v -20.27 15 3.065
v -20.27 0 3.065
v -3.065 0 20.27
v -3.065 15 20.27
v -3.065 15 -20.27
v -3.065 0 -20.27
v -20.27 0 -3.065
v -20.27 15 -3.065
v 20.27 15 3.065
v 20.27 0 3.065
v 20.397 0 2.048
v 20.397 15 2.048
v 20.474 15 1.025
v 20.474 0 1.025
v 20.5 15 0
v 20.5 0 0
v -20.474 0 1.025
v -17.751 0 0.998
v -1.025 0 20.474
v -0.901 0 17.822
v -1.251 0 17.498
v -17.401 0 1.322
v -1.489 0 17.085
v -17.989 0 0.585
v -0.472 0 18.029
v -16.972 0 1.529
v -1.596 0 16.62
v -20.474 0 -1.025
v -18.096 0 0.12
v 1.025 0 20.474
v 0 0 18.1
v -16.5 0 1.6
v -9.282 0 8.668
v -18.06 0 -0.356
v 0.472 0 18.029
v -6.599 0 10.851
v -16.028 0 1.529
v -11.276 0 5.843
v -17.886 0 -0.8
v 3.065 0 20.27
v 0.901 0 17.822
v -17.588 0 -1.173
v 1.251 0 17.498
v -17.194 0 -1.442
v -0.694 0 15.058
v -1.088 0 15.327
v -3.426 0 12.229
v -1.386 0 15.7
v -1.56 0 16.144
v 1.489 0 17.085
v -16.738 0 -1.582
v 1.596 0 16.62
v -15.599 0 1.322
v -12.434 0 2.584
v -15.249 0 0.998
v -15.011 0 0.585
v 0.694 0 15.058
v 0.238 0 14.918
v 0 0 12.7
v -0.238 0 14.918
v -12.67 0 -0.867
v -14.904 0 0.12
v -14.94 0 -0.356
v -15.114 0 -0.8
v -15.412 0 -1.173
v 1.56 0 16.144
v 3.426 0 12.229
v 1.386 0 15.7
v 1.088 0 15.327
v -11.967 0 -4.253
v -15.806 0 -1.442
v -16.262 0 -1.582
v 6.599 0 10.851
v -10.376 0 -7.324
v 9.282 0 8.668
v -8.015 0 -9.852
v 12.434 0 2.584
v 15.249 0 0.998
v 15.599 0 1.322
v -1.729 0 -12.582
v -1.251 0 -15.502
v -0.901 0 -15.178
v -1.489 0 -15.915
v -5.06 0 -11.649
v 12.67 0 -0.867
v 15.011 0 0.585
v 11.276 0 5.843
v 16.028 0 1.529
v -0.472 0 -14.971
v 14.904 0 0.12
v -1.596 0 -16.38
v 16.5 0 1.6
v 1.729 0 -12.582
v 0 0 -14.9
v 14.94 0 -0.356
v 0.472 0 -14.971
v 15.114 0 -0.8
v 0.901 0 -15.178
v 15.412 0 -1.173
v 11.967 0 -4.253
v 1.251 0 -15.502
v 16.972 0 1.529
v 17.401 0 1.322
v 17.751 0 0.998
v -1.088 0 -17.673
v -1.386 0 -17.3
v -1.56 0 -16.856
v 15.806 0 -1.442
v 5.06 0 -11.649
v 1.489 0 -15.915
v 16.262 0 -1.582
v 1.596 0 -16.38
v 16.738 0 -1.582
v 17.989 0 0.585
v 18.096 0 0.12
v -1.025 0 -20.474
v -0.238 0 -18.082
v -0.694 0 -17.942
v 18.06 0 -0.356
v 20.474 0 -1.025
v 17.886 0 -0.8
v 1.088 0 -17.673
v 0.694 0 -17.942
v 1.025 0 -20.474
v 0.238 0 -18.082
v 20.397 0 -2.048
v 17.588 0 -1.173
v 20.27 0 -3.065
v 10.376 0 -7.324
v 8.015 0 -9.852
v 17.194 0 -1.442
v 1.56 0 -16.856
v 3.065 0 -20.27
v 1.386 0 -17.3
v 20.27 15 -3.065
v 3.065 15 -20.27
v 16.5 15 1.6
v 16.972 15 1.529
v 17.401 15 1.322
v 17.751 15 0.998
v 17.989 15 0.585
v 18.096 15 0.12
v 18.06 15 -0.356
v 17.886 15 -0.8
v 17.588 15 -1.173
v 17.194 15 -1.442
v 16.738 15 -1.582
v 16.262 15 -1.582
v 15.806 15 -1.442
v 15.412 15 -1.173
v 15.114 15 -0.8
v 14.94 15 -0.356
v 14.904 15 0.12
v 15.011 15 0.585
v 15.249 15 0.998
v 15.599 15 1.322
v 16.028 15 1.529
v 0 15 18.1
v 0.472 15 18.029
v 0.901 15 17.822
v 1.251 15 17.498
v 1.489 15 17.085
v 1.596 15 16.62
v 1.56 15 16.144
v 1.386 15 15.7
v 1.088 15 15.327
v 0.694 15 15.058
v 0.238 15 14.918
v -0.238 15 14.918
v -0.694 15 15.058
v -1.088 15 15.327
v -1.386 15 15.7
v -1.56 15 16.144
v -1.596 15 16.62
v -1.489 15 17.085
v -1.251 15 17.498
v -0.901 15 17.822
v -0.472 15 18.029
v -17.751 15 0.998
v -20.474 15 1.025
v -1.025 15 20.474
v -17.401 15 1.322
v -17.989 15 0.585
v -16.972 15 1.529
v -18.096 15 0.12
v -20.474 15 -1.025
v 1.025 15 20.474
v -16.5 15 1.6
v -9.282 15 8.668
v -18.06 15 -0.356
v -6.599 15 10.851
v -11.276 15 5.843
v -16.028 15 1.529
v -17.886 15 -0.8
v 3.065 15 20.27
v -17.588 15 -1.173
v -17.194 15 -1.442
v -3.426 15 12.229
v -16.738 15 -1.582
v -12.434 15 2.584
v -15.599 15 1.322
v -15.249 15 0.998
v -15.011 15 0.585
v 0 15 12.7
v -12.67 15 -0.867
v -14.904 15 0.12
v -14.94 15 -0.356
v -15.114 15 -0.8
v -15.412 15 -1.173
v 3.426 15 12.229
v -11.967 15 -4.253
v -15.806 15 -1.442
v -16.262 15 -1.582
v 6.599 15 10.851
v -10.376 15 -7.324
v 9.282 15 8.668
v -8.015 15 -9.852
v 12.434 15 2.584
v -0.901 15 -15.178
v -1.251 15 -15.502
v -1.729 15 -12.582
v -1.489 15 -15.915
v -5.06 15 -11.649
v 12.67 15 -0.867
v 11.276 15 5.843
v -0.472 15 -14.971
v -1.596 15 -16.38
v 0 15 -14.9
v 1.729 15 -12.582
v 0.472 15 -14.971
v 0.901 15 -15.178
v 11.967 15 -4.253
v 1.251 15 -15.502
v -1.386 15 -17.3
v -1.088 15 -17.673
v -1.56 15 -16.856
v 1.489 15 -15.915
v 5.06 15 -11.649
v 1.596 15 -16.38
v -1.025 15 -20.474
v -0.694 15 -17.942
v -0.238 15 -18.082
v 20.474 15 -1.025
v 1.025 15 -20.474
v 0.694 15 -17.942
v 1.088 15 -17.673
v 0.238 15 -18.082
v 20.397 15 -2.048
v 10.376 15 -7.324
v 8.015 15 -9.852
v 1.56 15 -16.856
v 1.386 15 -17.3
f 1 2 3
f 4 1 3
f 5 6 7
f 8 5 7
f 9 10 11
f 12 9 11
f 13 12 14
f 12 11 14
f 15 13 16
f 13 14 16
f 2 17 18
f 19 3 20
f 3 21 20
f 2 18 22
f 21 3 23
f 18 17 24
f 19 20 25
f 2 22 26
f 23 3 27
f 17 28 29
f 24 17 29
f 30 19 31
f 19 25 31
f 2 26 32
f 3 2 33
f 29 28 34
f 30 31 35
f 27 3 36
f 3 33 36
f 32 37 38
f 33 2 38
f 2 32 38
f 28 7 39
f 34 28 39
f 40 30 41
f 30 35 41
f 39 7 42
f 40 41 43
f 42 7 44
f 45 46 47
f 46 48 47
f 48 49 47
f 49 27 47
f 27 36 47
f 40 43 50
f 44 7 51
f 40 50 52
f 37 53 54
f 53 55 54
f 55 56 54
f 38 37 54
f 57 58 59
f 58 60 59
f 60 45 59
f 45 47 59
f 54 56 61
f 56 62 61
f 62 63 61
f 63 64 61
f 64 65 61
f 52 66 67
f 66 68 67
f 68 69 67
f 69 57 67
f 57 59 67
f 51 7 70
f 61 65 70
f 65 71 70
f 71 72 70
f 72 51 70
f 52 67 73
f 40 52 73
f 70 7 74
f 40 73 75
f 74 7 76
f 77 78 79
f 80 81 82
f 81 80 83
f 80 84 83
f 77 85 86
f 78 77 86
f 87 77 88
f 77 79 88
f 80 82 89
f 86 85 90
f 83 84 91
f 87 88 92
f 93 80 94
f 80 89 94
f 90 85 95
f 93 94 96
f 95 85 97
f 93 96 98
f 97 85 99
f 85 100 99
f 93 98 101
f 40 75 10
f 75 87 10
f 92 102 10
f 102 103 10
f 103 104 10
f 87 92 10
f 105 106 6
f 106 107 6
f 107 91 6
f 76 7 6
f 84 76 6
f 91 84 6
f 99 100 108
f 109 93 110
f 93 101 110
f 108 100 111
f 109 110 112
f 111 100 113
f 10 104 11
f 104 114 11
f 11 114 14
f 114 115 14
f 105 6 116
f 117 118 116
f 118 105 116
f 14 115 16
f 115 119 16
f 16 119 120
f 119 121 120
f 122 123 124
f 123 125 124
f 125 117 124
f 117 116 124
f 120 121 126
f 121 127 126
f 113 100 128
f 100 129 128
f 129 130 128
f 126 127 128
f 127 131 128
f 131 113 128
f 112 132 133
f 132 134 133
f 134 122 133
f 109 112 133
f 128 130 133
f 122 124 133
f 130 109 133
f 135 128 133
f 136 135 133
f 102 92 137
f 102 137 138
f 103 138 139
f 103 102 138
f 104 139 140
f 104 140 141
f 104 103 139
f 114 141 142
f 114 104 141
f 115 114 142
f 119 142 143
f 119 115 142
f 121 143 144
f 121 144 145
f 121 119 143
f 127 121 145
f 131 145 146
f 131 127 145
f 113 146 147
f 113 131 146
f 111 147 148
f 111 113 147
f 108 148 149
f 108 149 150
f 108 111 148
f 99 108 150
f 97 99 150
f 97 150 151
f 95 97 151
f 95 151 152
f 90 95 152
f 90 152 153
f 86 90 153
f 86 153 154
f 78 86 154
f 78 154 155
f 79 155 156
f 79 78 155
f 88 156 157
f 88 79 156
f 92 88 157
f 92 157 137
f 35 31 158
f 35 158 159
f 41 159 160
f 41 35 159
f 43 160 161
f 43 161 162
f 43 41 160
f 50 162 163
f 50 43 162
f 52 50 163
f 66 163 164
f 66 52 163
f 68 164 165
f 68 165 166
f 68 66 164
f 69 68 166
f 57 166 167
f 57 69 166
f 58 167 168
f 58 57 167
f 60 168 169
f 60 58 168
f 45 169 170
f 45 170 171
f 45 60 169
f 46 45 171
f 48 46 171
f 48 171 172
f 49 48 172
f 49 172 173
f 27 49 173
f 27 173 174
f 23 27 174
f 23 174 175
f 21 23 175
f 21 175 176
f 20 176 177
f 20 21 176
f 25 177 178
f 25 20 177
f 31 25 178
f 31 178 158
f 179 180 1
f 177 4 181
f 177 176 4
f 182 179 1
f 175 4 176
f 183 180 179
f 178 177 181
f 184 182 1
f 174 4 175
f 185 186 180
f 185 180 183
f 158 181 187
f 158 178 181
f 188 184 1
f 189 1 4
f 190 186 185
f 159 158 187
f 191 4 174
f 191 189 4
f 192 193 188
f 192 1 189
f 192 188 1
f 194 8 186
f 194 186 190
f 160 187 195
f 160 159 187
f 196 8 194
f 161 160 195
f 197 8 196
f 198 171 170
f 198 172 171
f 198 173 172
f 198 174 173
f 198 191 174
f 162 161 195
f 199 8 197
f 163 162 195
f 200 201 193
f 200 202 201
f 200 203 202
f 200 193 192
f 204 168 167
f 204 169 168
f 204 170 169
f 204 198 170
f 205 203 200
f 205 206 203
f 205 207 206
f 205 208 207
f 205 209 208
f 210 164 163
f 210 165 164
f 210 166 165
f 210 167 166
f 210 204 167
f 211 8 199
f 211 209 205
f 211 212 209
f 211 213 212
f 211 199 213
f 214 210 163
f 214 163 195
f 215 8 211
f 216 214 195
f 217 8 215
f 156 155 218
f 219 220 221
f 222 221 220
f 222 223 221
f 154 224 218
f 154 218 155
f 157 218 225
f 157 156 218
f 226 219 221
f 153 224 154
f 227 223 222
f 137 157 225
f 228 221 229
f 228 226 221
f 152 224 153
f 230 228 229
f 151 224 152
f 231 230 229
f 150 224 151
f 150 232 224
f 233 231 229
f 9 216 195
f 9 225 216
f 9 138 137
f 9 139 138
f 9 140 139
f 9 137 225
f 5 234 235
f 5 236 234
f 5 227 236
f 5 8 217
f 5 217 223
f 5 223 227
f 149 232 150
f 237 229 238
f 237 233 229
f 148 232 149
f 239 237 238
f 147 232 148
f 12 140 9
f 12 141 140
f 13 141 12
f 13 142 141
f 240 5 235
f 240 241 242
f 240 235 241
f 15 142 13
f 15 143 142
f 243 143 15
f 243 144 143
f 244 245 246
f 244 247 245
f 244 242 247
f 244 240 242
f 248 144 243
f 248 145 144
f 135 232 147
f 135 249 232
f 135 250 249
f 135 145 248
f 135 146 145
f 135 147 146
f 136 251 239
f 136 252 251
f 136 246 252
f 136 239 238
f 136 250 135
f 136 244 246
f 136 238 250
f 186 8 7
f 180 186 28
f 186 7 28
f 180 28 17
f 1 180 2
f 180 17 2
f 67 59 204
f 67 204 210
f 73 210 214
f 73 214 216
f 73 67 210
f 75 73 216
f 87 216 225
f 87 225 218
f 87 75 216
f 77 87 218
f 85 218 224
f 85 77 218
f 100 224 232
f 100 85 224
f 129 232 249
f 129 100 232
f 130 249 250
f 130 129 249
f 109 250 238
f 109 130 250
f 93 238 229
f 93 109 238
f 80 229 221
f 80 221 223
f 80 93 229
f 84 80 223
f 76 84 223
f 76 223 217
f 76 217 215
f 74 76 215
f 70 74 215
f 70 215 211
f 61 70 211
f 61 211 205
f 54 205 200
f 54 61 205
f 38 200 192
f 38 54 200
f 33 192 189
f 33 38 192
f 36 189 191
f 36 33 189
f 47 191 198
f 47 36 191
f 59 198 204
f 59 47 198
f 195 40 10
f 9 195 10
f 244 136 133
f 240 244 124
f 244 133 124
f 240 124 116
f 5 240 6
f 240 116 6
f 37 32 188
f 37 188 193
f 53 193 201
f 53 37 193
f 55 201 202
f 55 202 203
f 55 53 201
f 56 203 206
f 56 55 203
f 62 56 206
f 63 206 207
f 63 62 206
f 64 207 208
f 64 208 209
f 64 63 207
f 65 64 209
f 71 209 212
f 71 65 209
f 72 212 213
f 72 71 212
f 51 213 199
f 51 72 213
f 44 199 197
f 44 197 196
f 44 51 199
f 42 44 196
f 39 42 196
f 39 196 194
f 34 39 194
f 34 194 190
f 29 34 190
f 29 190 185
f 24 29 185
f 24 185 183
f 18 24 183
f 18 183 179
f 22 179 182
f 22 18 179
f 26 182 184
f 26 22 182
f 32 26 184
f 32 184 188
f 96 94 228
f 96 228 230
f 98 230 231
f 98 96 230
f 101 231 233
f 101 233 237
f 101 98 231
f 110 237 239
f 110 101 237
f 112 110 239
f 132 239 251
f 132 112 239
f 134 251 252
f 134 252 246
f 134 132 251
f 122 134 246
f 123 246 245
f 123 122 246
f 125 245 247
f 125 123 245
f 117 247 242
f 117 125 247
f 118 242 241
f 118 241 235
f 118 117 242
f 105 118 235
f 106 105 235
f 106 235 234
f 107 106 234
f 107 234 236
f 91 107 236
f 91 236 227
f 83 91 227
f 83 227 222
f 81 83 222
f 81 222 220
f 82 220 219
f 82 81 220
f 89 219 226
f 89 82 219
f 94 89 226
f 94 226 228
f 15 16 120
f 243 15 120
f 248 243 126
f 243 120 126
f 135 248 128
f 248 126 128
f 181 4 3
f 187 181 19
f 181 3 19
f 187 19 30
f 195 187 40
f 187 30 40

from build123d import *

# Parameters (mm, degrees)
SKETCH_1_R      = 1.6
SKETCH_1_R_2    = 12.7
EXTRUDE_1_DEPTH = 15


with BuildPart() as part:
    # 草图1 → 凸台-拉伸1 (new body)
    with BuildSketch(Plane(origin=(0, 0, 0), x_dir=(1, 0, 0), z_dir=(0, 1, 0))):
        with BuildLine():
            Line((-3.064936623, 20.269587157), (-20.269587157, 3.064936623))
            ThreePointArc((-20.269587157, 3.064936623), (-20.5, 0), (-20.269587157, -3.064936623))
            Line((-20.269587157, -3.064936623), (-3.064936623, -20.269587157))
            ThreePointArc((-3.064936623, -20.269587157), (0, -20.5), (3.064936623, -20.269587157))
            Line((3.064936623, -20.269587157), (20.269587157, -3.064936623))
            ThreePointArc((20.269587157, -3.064936623), (20.442315631, -1.536792649), (20.5, 0))
            ThreePointArc((20.5, 0), (20.442315631, 1.536792649), (20.269587157, 3.064936623))
            Line((20.269587157, 3.064936623), (3.064936623, 20.269587157))
            ThreePointArc((3.064936623, 20.269587157), (0, 20.5), (-3.064936623, 20.269587157))
        make_face()
        with Locations(Location((-16.5, 0, 0), (0, 0, 270))):
            Circle(SKETCH_1_R, mode=Mode.SUBTRACT)
        with Locations(Location((0, -16.5, 0), (0, 0, 270))):
            Circle(SKETCH_1_R, mode=Mode.SUBTRACT)
        with Locations(Location((0, 0, 0), (0, 0, 270))):
            Circle(SKETCH_1_R_2, mode=Mode.SUBTRACT)
        with Locations(Location((16.5, 0, 0), (0, 0, 270))):
            Circle(SKETCH_1_R, mode=Mode.SUBTRACT)
        with Locations(Location((0, 16.5, 0), (0, 0, 270))):
            Circle(SKETCH_1_R, mode=Mode.SUBTRACT)
    extrude(amount=EXTRUDE_1_DEPTH)


solid = part.part
